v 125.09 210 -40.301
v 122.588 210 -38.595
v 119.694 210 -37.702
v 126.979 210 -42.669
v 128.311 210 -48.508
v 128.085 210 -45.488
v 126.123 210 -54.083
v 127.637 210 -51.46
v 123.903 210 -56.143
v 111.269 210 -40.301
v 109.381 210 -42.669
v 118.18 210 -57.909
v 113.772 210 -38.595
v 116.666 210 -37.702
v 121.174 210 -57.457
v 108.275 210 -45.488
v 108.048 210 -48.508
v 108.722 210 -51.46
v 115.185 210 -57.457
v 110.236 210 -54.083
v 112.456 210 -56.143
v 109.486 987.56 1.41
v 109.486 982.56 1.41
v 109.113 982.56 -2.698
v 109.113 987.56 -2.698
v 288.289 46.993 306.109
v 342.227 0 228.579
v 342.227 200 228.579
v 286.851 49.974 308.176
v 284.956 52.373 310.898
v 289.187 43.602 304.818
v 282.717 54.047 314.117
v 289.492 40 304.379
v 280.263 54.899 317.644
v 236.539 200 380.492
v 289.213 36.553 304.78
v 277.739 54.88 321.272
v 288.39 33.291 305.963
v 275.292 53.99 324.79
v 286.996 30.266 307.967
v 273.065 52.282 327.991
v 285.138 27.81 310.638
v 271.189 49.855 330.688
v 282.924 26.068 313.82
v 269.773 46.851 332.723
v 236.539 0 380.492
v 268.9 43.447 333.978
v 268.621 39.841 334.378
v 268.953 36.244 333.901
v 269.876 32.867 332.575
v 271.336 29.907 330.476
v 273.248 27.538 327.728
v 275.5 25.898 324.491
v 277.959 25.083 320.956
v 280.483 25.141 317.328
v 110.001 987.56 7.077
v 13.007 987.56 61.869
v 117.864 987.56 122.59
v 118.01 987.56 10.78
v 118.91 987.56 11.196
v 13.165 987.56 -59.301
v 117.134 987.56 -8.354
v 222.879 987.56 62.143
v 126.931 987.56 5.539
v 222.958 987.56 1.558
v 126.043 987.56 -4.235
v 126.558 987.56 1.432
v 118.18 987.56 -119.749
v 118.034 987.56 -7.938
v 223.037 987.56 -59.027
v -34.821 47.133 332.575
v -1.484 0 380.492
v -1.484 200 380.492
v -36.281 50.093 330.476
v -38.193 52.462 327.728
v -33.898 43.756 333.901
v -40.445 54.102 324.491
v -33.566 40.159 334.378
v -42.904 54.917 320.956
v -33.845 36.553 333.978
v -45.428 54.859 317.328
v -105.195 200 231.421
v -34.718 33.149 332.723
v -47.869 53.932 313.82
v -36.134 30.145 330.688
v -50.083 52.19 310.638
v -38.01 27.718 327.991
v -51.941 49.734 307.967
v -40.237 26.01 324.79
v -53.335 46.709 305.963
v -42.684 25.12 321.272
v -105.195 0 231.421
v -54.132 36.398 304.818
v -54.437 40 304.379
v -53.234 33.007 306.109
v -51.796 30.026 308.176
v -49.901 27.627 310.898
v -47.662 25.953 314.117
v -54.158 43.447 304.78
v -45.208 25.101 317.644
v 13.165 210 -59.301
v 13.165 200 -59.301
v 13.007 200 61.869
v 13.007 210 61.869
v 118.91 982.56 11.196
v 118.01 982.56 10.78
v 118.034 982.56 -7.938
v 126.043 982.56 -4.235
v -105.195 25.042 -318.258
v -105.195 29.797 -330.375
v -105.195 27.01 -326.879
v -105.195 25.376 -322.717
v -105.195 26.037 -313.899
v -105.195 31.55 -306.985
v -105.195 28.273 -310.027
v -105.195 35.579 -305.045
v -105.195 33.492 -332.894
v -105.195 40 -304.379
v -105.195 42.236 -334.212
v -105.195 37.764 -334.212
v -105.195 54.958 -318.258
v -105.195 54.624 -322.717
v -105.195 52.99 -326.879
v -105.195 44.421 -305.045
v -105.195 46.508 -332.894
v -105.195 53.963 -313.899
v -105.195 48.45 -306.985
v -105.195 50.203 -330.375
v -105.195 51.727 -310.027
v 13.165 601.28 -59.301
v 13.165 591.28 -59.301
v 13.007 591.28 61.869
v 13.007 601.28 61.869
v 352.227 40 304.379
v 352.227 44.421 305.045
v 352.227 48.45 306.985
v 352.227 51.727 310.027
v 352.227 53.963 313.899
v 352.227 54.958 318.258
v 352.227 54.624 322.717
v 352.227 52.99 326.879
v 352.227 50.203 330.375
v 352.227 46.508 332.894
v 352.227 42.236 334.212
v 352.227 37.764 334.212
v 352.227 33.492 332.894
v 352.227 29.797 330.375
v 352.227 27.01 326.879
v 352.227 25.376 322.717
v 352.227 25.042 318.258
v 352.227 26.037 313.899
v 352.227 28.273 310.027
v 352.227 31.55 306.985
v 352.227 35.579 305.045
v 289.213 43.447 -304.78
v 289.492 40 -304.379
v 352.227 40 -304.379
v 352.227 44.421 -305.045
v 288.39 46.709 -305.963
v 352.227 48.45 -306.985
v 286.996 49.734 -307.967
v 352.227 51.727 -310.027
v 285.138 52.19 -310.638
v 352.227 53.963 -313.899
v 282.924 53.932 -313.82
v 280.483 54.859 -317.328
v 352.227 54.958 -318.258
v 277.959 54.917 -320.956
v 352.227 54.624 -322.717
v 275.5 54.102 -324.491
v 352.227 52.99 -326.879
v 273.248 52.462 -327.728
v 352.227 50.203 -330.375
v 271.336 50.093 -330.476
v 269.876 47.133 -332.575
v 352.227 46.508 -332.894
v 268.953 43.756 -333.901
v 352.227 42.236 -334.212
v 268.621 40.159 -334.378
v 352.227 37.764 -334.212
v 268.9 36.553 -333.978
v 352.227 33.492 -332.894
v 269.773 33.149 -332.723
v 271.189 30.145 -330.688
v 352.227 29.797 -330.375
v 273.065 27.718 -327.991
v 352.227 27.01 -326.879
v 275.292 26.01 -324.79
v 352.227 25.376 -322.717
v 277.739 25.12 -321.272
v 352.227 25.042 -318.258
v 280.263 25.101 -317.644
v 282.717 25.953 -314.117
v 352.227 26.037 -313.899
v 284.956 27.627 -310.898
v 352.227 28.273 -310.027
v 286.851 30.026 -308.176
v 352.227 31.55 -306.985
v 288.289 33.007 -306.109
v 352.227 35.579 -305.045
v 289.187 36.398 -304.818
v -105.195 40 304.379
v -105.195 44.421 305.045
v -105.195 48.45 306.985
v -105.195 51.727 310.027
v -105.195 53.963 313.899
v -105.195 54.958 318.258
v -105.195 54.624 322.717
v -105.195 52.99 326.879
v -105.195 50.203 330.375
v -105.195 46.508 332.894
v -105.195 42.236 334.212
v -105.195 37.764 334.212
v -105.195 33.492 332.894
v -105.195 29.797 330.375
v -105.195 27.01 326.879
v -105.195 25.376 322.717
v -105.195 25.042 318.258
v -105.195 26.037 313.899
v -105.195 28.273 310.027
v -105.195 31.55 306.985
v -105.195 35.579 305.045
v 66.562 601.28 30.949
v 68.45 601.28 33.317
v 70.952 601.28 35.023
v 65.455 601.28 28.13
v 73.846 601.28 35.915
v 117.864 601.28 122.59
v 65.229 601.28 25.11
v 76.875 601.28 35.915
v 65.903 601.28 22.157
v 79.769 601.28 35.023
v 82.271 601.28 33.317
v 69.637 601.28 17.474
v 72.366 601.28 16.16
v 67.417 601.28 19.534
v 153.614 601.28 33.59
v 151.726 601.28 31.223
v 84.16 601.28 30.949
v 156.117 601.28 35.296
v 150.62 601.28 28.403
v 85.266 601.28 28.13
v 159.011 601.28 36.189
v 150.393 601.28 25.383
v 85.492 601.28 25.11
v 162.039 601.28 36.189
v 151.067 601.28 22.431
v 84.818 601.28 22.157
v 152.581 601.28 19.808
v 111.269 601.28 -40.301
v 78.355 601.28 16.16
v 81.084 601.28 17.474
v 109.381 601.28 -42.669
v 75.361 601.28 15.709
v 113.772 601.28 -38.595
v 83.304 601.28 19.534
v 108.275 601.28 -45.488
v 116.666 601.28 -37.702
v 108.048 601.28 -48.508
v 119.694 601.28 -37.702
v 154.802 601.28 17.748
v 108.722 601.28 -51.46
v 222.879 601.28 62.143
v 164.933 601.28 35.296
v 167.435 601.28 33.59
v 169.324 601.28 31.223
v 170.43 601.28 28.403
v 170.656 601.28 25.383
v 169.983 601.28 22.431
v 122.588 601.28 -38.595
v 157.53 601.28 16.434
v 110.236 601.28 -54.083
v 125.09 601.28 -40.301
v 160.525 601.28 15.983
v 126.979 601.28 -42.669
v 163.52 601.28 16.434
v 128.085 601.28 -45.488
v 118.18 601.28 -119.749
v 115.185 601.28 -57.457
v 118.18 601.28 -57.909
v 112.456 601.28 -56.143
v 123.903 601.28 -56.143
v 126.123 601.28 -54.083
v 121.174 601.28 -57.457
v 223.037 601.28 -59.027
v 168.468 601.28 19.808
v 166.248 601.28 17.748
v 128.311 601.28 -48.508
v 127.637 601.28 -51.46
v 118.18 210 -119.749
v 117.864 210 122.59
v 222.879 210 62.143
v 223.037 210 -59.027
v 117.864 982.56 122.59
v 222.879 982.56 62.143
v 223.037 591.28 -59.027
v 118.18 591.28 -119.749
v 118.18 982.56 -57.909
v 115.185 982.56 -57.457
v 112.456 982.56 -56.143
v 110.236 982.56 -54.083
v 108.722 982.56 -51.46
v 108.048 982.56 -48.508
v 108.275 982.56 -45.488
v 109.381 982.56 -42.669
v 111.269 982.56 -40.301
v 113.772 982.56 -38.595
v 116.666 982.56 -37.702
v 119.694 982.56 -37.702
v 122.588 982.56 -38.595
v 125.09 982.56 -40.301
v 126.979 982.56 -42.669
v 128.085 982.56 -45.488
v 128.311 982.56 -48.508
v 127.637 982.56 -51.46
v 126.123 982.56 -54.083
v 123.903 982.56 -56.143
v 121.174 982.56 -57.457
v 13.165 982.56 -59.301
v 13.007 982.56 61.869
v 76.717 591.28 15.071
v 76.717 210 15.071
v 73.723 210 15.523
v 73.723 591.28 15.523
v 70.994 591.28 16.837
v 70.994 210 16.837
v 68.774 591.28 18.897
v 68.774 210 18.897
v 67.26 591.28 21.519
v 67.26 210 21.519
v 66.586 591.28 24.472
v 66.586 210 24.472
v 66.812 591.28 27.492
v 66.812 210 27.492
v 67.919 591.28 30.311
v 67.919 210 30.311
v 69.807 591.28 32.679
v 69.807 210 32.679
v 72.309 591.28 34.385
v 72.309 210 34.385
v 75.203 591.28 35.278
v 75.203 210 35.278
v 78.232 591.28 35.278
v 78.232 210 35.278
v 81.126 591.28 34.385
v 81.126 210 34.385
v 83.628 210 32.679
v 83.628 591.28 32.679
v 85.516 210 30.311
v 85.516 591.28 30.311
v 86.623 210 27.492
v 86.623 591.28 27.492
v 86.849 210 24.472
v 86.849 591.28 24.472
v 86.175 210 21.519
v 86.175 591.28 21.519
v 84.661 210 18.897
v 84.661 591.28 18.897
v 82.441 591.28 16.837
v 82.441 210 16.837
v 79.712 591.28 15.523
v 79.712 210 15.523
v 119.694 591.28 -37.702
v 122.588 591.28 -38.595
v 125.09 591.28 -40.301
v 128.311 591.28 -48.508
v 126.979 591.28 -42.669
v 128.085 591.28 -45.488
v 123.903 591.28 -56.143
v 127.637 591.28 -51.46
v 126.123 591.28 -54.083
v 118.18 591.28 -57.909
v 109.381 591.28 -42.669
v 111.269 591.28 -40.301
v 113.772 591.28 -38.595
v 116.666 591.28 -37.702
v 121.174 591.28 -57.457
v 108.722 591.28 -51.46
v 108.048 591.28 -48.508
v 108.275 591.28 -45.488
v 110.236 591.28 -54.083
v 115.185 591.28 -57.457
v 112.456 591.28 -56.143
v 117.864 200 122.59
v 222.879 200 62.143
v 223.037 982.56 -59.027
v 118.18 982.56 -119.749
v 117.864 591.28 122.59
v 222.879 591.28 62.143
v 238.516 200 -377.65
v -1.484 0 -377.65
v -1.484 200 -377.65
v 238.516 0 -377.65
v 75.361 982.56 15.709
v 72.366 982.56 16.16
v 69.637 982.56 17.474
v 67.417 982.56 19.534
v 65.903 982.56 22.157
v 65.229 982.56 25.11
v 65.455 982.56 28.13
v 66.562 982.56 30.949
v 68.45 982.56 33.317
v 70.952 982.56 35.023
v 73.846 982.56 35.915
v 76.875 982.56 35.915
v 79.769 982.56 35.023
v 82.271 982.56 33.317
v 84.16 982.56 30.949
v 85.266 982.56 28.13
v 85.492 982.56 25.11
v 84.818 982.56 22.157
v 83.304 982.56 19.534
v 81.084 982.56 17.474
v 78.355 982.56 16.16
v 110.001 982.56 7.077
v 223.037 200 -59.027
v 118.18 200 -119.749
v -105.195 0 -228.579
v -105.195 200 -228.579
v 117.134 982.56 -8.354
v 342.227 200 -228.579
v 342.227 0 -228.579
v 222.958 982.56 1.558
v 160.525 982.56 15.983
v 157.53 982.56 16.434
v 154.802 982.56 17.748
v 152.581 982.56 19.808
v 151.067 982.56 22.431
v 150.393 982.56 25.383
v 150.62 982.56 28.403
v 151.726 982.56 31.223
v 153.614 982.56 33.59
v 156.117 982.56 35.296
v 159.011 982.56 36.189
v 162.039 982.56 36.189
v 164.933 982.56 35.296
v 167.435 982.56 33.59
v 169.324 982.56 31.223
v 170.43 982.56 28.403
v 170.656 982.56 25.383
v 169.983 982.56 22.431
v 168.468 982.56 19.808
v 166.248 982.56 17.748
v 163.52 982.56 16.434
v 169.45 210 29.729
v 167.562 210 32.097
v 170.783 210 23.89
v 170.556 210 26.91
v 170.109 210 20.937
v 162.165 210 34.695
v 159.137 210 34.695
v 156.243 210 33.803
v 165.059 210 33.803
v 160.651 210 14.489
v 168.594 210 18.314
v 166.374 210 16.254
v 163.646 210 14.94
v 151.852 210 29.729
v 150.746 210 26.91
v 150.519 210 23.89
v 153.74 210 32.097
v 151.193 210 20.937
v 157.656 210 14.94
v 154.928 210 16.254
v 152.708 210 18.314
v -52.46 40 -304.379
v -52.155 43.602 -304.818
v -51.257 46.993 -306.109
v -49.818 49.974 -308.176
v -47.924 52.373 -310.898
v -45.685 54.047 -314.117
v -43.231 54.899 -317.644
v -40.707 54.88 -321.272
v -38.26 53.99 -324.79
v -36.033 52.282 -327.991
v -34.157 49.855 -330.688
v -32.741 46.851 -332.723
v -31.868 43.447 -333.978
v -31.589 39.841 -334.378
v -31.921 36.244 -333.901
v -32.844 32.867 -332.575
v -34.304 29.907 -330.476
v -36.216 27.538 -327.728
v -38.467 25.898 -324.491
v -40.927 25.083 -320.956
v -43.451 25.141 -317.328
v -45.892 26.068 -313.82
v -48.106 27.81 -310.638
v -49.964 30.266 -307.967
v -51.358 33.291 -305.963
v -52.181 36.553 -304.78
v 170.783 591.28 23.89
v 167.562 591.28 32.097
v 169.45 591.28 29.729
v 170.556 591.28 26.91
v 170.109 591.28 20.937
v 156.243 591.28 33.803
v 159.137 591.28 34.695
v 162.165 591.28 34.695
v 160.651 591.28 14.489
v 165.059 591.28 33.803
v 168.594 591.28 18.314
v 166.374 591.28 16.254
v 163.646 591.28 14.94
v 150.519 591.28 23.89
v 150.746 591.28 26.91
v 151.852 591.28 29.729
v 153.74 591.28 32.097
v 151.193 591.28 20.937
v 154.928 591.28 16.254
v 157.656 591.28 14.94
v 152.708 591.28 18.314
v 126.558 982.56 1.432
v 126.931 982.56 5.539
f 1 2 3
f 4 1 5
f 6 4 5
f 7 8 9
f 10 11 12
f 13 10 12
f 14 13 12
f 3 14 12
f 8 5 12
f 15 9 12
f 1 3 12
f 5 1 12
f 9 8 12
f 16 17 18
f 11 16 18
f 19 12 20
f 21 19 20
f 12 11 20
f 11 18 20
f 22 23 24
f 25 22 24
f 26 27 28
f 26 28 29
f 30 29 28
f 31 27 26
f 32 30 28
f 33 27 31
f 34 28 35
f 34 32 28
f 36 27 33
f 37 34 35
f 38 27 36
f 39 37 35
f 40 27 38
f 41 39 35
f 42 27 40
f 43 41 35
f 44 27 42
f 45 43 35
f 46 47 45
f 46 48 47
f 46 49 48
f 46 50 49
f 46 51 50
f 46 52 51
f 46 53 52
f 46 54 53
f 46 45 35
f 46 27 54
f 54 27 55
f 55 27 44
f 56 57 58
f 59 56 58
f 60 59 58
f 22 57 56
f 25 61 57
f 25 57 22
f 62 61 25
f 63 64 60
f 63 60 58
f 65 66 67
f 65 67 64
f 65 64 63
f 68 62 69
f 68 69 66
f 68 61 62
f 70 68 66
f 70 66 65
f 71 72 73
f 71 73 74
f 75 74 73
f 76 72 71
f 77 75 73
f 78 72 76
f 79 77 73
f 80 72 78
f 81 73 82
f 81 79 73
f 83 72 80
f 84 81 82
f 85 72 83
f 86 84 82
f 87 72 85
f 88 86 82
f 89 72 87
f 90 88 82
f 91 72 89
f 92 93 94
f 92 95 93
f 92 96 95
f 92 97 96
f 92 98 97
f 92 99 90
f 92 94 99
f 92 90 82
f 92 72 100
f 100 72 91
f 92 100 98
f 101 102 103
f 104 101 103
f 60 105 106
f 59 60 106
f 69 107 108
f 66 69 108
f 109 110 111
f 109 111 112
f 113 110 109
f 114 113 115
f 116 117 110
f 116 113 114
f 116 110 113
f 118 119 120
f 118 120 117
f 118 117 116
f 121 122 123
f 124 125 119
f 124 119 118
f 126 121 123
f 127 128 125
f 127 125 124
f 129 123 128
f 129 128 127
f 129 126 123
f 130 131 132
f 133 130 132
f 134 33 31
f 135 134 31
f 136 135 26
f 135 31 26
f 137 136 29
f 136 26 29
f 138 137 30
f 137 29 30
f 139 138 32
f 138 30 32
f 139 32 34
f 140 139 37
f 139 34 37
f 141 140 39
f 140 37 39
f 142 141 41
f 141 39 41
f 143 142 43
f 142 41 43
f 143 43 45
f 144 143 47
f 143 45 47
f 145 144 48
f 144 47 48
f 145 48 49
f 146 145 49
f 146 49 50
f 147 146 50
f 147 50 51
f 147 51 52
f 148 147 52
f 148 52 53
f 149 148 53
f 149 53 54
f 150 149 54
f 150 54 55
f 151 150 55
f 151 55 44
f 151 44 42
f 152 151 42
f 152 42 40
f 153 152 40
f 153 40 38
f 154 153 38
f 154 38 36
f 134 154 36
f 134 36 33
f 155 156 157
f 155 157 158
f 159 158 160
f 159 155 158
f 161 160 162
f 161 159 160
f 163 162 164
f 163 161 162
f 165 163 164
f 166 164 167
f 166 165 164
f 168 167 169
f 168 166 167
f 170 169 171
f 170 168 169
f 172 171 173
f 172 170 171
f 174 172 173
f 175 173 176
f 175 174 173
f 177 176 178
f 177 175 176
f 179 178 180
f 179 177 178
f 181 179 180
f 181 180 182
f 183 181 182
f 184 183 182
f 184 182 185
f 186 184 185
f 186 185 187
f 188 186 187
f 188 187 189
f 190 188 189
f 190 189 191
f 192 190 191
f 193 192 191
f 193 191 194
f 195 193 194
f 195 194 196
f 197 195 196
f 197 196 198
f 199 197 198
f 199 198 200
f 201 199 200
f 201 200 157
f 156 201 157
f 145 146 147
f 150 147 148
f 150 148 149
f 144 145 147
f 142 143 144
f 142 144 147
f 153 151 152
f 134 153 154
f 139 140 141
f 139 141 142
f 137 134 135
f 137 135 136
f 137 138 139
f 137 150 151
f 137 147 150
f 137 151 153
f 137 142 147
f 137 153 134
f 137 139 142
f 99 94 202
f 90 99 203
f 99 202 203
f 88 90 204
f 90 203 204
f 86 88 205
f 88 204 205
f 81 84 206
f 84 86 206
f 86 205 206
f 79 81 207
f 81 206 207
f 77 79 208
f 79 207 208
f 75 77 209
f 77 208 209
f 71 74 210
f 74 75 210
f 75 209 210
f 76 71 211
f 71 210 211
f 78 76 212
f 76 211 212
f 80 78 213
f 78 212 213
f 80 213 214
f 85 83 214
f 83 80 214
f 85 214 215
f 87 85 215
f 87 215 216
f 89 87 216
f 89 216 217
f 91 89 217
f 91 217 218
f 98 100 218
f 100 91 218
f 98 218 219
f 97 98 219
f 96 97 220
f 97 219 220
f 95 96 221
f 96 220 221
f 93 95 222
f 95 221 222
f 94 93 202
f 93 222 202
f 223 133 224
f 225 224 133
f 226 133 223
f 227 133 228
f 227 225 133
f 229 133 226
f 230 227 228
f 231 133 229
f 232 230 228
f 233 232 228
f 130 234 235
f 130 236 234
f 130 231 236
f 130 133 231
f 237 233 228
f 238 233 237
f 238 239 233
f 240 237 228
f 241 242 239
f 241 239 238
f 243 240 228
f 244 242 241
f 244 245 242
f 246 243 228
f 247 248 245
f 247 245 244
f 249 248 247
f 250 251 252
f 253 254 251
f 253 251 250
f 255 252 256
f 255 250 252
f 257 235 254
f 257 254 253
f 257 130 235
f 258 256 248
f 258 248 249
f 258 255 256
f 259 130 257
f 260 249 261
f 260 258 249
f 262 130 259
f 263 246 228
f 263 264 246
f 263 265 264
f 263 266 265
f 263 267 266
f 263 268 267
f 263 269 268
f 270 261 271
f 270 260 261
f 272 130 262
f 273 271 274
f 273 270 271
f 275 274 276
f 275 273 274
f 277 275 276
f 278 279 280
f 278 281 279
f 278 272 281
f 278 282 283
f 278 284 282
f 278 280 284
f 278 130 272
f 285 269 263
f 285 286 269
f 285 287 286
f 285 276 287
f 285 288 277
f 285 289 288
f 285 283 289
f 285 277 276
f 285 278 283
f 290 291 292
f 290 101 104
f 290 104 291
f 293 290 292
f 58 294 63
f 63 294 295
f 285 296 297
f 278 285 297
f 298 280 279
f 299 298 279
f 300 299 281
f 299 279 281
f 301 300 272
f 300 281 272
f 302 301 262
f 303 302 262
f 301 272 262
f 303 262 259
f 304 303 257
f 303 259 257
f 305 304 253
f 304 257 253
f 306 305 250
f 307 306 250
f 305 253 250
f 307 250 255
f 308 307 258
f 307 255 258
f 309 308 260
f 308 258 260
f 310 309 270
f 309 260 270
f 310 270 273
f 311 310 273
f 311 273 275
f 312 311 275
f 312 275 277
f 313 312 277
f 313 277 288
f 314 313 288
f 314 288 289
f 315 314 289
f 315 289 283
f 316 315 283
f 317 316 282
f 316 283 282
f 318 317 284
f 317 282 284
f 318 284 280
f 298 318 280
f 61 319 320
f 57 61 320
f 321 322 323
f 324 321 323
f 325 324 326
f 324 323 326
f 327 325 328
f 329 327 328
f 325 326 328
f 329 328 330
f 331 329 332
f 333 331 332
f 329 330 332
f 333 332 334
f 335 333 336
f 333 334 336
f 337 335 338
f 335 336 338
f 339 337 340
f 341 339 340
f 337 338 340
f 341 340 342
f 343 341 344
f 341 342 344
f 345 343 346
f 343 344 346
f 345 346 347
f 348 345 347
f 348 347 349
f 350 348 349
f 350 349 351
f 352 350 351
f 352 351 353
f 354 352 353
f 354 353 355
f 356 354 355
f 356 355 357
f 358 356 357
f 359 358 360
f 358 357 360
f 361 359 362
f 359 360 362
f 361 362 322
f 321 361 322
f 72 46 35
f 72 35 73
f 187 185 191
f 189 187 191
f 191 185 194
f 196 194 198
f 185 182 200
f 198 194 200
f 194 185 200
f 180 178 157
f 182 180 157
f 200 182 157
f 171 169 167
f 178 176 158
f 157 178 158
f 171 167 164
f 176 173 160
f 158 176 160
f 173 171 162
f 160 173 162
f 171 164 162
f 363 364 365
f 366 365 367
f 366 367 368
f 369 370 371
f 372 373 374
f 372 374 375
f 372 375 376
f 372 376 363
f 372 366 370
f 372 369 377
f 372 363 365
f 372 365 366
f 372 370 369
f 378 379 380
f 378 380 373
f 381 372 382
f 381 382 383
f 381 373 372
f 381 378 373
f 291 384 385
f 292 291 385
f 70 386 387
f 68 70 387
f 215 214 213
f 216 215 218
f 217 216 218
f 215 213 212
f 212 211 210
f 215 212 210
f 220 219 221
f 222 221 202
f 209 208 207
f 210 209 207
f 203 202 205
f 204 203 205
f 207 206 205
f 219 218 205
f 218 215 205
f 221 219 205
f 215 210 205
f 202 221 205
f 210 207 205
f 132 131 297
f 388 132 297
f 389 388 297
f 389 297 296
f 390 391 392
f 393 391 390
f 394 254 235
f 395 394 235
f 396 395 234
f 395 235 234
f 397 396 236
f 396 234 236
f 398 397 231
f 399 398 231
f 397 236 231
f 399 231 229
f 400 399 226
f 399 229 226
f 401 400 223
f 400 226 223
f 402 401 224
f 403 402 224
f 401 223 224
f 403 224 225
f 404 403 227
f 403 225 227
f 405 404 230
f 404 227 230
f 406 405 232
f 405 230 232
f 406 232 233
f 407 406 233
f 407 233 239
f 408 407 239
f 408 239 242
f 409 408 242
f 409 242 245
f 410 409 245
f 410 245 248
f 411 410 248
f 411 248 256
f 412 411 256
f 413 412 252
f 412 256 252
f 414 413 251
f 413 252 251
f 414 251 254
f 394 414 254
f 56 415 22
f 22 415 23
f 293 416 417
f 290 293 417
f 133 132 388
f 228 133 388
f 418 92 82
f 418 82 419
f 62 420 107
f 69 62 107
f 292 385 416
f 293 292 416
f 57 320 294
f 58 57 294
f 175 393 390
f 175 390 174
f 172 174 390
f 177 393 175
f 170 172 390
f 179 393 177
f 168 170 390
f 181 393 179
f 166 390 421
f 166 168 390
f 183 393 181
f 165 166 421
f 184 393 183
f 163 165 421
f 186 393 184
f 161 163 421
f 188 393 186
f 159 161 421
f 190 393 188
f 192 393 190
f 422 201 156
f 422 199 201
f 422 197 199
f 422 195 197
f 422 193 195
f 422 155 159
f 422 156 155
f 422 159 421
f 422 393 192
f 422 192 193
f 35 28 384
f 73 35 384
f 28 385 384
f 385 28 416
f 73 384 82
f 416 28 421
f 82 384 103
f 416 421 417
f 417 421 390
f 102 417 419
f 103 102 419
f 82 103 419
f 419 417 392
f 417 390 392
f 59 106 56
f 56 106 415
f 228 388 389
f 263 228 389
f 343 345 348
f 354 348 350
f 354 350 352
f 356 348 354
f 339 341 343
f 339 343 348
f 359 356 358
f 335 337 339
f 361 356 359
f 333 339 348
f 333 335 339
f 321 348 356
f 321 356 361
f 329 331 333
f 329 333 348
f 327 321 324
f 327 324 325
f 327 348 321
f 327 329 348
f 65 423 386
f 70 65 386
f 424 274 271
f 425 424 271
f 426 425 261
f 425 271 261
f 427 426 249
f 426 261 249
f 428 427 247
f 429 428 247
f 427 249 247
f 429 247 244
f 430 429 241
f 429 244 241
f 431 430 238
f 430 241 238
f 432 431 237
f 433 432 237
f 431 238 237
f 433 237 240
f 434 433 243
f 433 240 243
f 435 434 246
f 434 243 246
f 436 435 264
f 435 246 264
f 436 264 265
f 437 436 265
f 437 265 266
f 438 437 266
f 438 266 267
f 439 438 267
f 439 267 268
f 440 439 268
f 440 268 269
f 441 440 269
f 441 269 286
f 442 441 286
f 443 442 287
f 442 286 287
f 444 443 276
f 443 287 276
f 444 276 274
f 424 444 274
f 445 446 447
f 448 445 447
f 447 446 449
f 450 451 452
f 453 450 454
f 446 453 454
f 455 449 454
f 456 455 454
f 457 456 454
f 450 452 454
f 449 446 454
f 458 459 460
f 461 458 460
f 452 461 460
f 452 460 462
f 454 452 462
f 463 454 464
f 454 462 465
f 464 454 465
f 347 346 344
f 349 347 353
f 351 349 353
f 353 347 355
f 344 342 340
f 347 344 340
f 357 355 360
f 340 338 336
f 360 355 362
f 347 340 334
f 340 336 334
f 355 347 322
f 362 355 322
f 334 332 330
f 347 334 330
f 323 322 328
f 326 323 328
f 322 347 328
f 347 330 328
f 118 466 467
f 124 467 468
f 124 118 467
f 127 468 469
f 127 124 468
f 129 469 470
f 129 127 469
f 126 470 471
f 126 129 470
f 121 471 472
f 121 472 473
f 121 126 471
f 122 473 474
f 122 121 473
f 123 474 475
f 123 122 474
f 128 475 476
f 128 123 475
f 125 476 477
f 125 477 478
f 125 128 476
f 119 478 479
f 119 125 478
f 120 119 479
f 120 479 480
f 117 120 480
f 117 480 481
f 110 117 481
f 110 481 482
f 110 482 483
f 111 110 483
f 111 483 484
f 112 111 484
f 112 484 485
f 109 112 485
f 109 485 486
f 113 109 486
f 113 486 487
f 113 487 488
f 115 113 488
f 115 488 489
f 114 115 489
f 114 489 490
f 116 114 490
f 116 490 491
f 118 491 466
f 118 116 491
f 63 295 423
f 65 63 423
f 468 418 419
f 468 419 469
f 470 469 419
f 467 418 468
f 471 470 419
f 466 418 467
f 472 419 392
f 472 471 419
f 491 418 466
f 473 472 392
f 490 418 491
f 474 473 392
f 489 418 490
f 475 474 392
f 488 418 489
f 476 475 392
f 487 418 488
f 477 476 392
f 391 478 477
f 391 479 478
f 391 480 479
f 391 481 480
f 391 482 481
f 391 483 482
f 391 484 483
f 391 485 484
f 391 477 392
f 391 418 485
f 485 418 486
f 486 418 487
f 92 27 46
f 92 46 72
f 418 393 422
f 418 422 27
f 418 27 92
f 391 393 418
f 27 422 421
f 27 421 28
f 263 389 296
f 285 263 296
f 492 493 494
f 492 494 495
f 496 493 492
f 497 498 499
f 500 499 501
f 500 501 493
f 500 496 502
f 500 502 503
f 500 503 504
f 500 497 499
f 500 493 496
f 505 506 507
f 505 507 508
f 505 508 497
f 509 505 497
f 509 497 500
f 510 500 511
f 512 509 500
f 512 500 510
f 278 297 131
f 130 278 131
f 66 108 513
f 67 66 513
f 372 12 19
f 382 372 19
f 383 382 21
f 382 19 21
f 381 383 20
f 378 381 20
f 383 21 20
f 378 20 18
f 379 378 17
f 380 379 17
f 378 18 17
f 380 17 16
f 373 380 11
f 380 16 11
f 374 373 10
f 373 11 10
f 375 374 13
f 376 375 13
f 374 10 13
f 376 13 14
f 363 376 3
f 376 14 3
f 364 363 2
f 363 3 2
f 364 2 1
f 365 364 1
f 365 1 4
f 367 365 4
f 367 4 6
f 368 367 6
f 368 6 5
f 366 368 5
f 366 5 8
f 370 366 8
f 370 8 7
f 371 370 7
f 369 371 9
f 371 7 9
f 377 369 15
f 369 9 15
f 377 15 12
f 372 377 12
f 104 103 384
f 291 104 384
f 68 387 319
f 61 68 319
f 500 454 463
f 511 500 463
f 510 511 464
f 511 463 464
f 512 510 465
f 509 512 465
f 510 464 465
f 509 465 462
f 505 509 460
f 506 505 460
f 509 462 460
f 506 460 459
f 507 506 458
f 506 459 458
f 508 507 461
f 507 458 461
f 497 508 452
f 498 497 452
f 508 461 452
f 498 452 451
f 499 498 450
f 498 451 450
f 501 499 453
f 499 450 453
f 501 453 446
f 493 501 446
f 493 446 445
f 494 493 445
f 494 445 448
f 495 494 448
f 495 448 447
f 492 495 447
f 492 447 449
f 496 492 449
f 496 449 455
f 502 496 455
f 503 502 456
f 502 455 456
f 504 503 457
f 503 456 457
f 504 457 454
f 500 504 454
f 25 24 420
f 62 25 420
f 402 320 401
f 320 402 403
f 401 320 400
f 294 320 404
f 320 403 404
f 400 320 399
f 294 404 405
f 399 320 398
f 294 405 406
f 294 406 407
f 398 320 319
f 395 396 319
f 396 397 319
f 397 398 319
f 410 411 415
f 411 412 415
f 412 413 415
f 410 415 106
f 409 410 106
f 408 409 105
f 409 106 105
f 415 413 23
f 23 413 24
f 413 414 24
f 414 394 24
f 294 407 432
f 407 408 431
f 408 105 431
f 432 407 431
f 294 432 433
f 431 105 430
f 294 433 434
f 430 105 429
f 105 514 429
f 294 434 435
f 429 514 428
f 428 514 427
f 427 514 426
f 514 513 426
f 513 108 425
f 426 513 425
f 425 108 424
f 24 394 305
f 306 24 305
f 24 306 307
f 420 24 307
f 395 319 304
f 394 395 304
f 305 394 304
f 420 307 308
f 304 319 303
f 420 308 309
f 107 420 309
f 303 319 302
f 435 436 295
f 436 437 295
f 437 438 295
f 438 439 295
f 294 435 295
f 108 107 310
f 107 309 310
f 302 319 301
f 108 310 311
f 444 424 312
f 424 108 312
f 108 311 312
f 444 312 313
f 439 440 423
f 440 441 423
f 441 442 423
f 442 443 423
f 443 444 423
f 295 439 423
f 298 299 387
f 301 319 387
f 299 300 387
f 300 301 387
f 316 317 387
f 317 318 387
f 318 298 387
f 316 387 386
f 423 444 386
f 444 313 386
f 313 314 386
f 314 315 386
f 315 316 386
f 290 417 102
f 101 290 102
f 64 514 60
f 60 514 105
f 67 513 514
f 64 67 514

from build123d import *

# Parameters (mm, degrees)
BOSS_EXTRUDE1_DEPTH   = 200
BOSS_EXTRUDE2_DEPTH   = 10
SKETCH3_R             = 10.16
BOSS_EXTRUDE3_DEPTH   = 381.28
BOSS_EXTRUDE3_2_DEPTH = 381.28
BOSS_EXTRUDE3_3_DEPTH = 381.28
BOSS_EXTRUDE4_DEPTH   = 10
SKETCH6_R             = 10.16
BOSS_EXTRUDE5_DEPTH   = 381.28
BOSS_EXTRUDE6_DEPTH   = 5
BOSS_EXTRUDE9_START   = -457.4224
SKETCH11_R            = 15
BOSS_EXTRUDE9_DEPTH   = 457.4224


with BuildPart() as part:
    # Sketch1 → Boss-Extrude1 (new body)
    with BuildSketch(Plane(origin=(0, 0, 0), x_dir=(1, 0, 0), z_dir=(0, 1, 0))):
        Polygon((-1.483930898, -380.492285736), (-105.195130657, -231.420921496), (-105.195130657, 228.579078504), (-1.483930898, 377.650442745), (238.516069102, 377.650442745), (342.227268861, 228.579078504), (342.227268861, -228.579078504), (236.538956009, -380.492285736), align=None)
    extrude(amount=BOSS_EXTRUDE1_DEPTH)

    # Sketch2 → Boss-Extrude2 (add)
    with BuildSketch(Plane(origin=(0, 200, 0), x_dir=(1, 0, 0), z_dir=(0, 1, 0))):
        Polygon((117.863795573, -122.590474184), (222.878703994, -62.142525746), (223.036699251, 59.027026943), (118.179786085, 119.748631193), (13.164877663, 59.300682754), (13.006882407, -61.868869934), align=None)
    extrude(amount=BOSS_EXTRUDE2_DEPTH)

    # Sketch11 → Boss-Extrude9 (add)
    with BuildSketch(Plane(origin=(352.227268861, 0, 0), x_dir=(0, 0, -1), z_dir=(1, 0, 0)).offset(BOSS_EXTRUDE9_START)):
        with Locations((-319.379078504, 40)):
            Circle(SKETCH11_R)
    boss_extrude9 = extrude(amount=BOSS_EXTRUDE9_DEPTH)

    # Mirror6: Boss-Extrude9 across plane
    add(boss_extrude9.mirror(Plane.XY))


with BuildPart() as body_2:
    # Sketch3 → Boss-Extrude3 (new body)
    with BuildSketch(Plane(origin=(0, 210, 0), x_dir=(1, 0, 0), z_dir=(0, 1, 0))):
        with Locations(Location((118.179786085, 47.748631193, 0), (0, 0, 90))):
            Circle(SKETCH3_R)
    extrude(amount=BOSS_EXTRUDE3_DEPTH)


with BuildPart() as body_3:
    # Sketch3 → Boss-Extrude3 2 (new body)
    with BuildSketch(Plane(origin=(0, 210, 0), x_dir=(1, 0, 0), z_dir=(0, 1, 0))):
        with Locations(Location((160.651015276, -24.648777083, 0), (0, 0, 90))):
            Circle(SKETCH3_R)
    extrude(amount=BOSS_EXTRUDE3_2_DEPTH)


with BuildPart() as body_4:
    # Sketch3 → Boss-Extrude3 3 (new body)
    with BuildSketch(Plane(origin=(0, 210, 0), x_dir=(1, 0, 0), z_dir=(0, 1, 0))):
        with Locations(Location((76.717405945, -25.231236354, 0), (0, 0, 90))):
            Circle(SKETCH3_R)
    extrude(amount=BOSS_EXTRUDE3_3_DEPTH)


with BuildPart() as body_5:
    # Sketch4 → Boss-Extrude4 (new body)
    with BuildSketch(Plane(origin=(0, 591.28, 0), x_dir=(1, 0, 0), z_dir=(0, 1, 0))):
        Polygon((197.21545944, 46.136372217), (118.140988501, 89.994029365), (117.902593157, -92.835872356), (119.610781014, -93.783297188), (198.804449625, -46.226003475), align=None)
        Polygon((118.140988501, 89.994029365), (118.179786085, 119.748631193), (13.164877663, 59.300682754), (13.006882407, -61.868869934), (117.863795573, -122.590474184), (117.902593157, -92.835872356), (38.828122218, -48.978215208), (37.239132033, 43.384160484), (116.432800644, 90.941454197), align=None)
        Polygon((117.902593157, -92.835872356), (118.140988501, 89.994029365), (116.432800644, 90.941454197), (37.239132033, 43.384160484), (38.828122218, -48.978215208), align=None)
        Polygon((223.036699251, 59.027026943), (118.179786085, 119.748631193), (118.140988501, 89.994029365), (197.21545944, 46.136372217), (198.804449625, -46.226003475), (119.610781014, -93.783297188), (117.902593157, -92.835872356), (117.863795573, -122.590474184), (222.878703994, -62.142525746), align=None)
    extrude(amount=BOSS_EXTRUDE4_DEPTH)

    # Sketch6 → Boss-Extrude5 (add)
    with BuildSketch(Plane(origin=(0, 601.28, 0), x_dir=(1, 0, 0), z_dir=(0, 1, 0))):
        with Locations(Location((118.179786085, 47.748631193, 0), (0, 0, 90))):
            Circle(SKETCH6_R)
        with Locations(Location((160.524874922, -26.142525746, 0), (0, 0, 90))):
            Circle(SKETCH6_R)
        with Locations(Location((75.360711479, -25.868869934, 0), (0, 0, 90))):
            Circle(SKETCH6_R)
    extrude(amount=BOSS_EXTRUDE5_DEPTH)

    # Sketch7 → Boss-Extrude6 (add)
    with BuildSketch(Plane(origin=(0, 982.56, 0), x_dir=(1, 0, 0), z_dir=(0, 1, 0))):
        Polygon((109.485792495, -1.409791247), (38.021858837, -1.316608081), (37.961633459, -47.504590352), (117.901340073, -93.796886037), (118.009587888, -10.779587912), (110.000531921, -7.077133909), align=None)
        Polygon((118.03399377, 7.937744921), (118.142241584, 90.955043046), (38.082084215, 44.871374189), (38.021858837, -1.316608081), (109.485792495, -1.409791247), (109.112737735, 2.697586282), (117.133996643, 8.353798696), align=None)
        Polygon((118.142241584, 90.955043046), (118.179786085, 119.748631193), (13.164877663, 59.300682754), (13.085880035, -1.28409359), (38.021858837, -1.316608081), (38.082084215, 44.871374189), align=None)
        Polygon((38.021858837, -1.316608081), (13.085880035, -1.28409359), (13.006882407, -61.868869934), (117.863795573, -122.590474184), (117.901340073, -93.796886037), (37.961633459, -47.504590352), align=None)
        Polygon((197.961497443, -47.713217181), (198.021722821, -1.52523491), (126.557789163, -1.432051744), (126.930843922, -5.539429273), (118.909585014, -11.195641687), (118.009587888, -10.779587912), (117.901340073, -93.796886037), align=None)
        Polygon((222.878703994, -62.142525746), (222.957701623, -1.557749401), (198.021722821, -1.52523491), (197.961497443, -47.713217181), (117.901340073, -93.796886037), (117.863795573, -122.590474184), align=None)
        Polygon((198.081948198, 44.662747361), (118.142241584, 90.955043046), (118.03399377, 7.937744921), (126.043049736, 4.235290918), (126.557789163, -1.432051744), (198.021722821, -1.52523491), align=None)
        Polygon((223.036699251, 59.027026943), (118.179786085, 119.748631193), (118.142241584, 90.955043046), (198.081948198, 44.662747361), (198.021722821, -1.52523491), (222.957701623, -1.557749401), align=None)
    extrude(amount=BOSS_EXTRUDE6_DEPTH)


solid = Compound([part.part, body_2.part, body_3.part, body_4.part, body_5.part])
